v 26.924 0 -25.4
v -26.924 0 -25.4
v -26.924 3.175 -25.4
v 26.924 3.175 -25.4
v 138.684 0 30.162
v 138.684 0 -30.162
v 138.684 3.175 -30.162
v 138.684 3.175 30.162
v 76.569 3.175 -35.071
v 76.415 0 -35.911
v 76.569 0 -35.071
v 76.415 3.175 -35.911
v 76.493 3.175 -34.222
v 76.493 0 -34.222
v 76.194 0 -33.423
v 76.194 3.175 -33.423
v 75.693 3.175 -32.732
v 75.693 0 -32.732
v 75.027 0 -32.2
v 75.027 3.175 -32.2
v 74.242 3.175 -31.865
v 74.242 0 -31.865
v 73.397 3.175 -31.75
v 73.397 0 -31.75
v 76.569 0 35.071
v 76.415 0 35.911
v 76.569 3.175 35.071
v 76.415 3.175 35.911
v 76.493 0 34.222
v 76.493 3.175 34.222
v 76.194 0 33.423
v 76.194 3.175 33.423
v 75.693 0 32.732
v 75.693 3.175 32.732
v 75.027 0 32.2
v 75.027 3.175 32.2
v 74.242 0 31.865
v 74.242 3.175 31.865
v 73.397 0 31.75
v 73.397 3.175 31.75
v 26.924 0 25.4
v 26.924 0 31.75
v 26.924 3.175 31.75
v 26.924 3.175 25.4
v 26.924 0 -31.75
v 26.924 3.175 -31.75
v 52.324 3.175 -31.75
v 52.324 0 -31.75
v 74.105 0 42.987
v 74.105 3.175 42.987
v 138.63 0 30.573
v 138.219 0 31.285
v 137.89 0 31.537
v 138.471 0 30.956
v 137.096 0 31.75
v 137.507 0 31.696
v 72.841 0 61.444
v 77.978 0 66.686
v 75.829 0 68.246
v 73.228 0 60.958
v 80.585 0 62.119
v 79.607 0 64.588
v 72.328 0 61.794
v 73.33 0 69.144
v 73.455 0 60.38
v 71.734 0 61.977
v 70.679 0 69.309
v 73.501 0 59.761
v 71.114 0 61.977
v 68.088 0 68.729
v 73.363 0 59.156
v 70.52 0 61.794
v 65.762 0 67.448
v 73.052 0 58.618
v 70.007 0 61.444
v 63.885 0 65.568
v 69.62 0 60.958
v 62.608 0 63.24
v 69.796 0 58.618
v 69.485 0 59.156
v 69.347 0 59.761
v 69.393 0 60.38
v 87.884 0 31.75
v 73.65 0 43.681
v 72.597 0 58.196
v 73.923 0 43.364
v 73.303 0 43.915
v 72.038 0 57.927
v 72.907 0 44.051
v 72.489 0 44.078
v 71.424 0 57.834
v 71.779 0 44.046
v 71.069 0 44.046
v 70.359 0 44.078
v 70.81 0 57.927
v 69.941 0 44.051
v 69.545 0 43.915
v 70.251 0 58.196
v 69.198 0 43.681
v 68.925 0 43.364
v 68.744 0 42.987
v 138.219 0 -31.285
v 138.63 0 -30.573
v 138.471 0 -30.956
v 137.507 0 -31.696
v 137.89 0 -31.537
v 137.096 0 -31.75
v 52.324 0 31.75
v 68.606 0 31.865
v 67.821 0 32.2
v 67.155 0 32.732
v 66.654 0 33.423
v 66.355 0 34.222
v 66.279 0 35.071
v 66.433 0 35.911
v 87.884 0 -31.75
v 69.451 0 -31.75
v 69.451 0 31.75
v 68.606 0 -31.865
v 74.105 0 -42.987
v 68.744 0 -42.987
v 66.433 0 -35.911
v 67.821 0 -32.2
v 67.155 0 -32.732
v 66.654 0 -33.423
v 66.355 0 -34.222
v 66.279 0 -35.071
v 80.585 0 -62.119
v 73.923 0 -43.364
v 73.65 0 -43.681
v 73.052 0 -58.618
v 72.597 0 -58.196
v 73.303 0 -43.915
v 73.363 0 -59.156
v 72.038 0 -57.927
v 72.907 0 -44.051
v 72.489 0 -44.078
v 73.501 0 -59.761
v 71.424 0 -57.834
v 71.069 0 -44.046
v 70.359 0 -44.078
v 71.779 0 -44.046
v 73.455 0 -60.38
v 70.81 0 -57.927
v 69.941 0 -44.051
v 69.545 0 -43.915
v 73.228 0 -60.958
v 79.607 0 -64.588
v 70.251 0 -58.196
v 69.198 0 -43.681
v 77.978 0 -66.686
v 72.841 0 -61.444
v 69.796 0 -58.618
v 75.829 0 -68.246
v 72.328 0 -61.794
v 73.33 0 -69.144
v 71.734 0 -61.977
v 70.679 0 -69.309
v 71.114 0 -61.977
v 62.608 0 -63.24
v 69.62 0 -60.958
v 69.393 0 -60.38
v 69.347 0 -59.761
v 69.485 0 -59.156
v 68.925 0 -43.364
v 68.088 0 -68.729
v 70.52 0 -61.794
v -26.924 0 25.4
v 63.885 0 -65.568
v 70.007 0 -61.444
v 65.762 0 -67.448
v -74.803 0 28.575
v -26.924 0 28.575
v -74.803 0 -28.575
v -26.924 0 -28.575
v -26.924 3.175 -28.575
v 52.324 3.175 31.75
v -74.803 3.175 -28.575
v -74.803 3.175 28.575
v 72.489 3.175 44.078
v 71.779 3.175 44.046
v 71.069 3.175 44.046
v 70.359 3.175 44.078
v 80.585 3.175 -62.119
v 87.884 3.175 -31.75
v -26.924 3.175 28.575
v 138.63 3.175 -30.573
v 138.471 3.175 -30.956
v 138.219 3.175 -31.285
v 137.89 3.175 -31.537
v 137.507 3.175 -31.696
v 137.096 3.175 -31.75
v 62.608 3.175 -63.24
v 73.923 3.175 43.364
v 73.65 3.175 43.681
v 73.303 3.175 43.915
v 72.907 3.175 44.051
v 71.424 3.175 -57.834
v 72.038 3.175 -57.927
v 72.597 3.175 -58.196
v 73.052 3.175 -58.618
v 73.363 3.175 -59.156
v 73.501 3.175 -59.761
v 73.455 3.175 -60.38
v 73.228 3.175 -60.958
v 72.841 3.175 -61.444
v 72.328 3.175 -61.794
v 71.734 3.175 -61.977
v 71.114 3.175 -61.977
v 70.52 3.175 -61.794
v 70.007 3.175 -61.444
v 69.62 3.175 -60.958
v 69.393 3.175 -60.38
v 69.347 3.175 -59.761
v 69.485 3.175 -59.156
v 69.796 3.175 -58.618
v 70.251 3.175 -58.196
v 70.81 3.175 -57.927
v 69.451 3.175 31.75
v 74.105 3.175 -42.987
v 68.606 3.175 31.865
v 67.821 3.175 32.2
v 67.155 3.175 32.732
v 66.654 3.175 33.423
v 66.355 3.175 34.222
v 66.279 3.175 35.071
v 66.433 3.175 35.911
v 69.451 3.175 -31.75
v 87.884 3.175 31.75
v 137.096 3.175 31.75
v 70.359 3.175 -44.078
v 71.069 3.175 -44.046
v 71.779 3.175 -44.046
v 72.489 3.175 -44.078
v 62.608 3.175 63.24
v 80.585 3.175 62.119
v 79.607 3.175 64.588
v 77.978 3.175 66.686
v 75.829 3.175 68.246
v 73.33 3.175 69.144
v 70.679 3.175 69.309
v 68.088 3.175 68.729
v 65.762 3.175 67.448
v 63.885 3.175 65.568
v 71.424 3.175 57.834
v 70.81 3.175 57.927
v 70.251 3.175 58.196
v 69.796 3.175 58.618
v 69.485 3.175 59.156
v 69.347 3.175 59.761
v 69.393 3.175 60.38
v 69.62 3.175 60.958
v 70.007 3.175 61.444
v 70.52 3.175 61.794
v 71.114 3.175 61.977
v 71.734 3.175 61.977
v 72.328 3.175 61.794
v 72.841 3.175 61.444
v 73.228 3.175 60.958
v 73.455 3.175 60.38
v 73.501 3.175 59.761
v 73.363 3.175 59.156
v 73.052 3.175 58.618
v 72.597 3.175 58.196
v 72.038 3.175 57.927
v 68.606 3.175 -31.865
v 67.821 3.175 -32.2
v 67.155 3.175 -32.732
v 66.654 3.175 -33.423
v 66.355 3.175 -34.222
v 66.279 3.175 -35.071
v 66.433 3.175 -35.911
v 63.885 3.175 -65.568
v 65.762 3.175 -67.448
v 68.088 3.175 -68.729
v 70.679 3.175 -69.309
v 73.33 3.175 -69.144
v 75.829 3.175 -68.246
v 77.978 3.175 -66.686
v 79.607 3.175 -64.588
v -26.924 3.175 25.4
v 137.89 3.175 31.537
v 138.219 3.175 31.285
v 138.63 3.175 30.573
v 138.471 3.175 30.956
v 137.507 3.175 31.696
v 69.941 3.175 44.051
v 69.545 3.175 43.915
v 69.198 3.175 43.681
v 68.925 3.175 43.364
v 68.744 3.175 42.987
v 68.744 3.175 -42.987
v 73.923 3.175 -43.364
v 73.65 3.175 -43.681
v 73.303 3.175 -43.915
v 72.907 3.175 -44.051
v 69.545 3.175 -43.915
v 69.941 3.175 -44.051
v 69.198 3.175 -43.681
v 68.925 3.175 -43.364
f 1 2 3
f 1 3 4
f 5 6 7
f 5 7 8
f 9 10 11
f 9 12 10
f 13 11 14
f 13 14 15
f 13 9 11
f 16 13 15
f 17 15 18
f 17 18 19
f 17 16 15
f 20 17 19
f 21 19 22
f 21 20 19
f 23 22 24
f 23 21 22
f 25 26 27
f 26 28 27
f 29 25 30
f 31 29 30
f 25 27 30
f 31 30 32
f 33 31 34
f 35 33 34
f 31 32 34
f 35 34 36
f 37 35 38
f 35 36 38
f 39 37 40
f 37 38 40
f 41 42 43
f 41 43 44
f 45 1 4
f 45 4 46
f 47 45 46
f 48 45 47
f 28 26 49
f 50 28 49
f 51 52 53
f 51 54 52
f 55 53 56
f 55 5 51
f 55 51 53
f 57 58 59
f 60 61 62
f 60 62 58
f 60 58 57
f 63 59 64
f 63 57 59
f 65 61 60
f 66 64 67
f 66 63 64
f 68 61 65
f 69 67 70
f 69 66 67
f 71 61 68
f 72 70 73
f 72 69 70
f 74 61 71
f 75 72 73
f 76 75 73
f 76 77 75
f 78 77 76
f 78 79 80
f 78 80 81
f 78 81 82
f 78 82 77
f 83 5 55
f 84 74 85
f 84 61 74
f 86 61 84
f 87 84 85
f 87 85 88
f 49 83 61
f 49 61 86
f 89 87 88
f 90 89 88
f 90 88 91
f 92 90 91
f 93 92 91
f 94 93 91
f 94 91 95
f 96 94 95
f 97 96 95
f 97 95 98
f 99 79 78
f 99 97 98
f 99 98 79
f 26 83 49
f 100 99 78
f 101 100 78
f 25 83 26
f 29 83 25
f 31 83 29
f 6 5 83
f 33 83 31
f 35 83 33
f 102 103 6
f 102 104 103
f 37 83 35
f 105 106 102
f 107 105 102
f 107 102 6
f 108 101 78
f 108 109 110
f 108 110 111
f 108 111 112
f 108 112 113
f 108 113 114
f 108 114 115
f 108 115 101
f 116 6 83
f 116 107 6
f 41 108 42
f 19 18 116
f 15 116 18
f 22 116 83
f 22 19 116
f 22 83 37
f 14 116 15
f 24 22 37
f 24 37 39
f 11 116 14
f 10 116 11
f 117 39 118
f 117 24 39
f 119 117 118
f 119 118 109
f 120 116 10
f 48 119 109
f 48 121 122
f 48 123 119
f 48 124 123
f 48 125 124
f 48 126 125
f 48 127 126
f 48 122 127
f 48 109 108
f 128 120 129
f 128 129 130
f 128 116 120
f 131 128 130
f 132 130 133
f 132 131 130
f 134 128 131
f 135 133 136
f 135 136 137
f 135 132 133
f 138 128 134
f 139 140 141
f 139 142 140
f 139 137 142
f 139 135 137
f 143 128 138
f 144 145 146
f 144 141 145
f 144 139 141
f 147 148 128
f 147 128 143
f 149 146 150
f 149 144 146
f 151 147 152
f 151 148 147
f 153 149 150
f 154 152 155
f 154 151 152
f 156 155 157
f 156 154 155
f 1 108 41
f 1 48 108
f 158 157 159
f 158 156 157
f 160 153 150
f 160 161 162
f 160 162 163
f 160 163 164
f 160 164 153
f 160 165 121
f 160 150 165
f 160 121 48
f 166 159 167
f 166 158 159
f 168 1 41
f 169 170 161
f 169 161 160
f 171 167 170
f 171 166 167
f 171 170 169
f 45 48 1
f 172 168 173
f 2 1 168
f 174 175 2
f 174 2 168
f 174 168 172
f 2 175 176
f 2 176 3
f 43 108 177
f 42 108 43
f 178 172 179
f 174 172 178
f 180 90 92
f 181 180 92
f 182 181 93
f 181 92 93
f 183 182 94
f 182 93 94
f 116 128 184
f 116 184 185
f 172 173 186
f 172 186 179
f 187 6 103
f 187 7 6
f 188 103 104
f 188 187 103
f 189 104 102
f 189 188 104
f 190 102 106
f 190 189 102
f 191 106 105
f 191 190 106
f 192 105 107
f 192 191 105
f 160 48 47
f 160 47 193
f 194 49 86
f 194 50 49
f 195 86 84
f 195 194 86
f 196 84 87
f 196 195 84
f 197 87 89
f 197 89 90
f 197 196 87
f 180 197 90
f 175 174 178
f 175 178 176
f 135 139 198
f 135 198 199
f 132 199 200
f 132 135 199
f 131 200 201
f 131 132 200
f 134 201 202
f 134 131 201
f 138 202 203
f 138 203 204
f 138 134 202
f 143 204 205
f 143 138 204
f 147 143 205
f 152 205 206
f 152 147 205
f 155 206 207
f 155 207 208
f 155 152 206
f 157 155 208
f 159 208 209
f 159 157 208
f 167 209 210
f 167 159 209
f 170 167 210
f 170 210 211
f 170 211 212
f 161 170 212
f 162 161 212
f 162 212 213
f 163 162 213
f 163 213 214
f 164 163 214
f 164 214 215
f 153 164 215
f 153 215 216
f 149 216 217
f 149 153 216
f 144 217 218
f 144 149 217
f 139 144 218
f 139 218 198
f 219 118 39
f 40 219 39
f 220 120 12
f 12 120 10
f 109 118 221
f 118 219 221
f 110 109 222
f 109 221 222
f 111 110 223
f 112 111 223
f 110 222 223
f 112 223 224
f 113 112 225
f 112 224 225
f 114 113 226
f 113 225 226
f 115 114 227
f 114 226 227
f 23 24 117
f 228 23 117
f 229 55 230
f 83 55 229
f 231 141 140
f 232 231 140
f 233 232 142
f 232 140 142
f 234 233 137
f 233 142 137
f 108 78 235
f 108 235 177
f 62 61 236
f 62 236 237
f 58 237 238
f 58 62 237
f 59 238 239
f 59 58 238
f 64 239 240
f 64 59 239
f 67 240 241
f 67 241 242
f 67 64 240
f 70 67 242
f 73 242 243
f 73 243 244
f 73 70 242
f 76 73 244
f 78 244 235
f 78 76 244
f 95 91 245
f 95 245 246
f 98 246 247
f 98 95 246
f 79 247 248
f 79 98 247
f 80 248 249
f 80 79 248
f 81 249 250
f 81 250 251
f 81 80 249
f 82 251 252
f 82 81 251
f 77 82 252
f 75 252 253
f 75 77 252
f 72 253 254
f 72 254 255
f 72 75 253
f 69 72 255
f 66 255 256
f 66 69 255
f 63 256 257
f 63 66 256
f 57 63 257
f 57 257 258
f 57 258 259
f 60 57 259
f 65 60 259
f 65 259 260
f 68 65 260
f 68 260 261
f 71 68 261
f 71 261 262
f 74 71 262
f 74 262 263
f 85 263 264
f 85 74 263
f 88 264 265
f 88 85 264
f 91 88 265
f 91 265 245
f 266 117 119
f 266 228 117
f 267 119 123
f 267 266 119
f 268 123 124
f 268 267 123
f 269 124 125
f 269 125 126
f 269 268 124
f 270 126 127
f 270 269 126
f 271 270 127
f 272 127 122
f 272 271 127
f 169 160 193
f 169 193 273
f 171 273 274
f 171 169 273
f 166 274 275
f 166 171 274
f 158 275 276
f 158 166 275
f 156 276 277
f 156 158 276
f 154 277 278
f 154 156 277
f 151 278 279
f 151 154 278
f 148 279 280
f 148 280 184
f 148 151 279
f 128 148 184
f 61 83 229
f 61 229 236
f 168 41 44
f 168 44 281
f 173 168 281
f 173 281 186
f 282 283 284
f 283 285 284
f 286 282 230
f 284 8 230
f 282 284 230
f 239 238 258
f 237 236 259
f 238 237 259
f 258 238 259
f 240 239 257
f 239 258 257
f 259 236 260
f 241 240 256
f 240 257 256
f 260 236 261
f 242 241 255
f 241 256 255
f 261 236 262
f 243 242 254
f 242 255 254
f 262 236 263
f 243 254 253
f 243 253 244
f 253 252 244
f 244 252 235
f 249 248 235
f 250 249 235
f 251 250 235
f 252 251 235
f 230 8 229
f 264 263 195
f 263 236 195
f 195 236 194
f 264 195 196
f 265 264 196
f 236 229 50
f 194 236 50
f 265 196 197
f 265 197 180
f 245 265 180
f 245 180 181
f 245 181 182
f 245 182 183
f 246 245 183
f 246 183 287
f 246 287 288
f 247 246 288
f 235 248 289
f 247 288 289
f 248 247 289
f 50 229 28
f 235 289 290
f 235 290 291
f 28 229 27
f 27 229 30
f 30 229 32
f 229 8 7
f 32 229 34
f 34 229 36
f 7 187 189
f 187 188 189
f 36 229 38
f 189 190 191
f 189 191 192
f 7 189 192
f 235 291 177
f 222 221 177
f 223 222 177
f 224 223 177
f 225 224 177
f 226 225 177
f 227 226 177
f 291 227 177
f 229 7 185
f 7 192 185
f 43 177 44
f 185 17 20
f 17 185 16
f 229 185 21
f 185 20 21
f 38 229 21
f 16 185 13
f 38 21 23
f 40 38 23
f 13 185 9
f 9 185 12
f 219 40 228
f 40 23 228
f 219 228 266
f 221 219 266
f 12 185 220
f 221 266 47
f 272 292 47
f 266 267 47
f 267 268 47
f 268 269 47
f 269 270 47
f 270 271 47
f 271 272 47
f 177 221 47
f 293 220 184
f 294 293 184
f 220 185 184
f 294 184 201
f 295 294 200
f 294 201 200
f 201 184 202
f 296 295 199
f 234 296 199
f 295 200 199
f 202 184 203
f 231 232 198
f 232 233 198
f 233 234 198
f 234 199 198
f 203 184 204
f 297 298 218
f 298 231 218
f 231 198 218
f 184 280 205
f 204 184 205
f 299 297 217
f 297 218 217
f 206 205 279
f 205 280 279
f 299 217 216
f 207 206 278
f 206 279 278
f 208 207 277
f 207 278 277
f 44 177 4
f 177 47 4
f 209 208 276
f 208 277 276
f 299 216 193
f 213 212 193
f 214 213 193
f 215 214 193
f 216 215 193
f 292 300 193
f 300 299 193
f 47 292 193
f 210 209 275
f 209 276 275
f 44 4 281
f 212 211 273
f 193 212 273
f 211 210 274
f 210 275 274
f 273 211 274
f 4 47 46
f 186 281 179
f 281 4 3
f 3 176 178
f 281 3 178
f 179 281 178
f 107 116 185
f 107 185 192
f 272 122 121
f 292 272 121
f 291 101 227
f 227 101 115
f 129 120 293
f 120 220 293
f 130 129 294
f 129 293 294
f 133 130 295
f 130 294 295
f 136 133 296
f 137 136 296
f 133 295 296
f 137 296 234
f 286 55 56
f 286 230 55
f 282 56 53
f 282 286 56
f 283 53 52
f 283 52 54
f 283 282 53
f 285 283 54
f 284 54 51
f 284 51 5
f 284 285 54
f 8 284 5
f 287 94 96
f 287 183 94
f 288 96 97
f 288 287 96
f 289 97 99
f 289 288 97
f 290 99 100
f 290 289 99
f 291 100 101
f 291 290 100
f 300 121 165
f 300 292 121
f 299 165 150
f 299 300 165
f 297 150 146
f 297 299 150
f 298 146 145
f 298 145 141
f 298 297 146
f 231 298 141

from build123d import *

# Parameters (mm, degrees)
SKETCH1_R           = 2.0828
BOSS_EXTRUDE1_DEPTH = 3.175
FILLET1_R           = 1.5875
FILLET2_R           = 3.175
FILLET3_R           = 1.5875


with BuildPart() as part:
    # Sketch1 → Boss-Extrude1 (new body)
    with BuildSketch(Plane(origin=(0, 0, 0), x_dir=(1, 0, 0), z_dir=(0, 1, 0))):
        with BuildLine():
            Line((26.924, -25.4), (-26.924, -25.4))
            Line((-26.924, -25.4), (-26.924, -28.575))
            Line((-26.924, -28.575), (-46.228, -28.575))
            Line((-46.228, -28.575), (-74.803, -28.575))
            Line((-74.803, -28.575), (-74.803, 28.575))
            Line((-74.803, 28.575), (-46.228, 28.575))
            Line((-46.228, 28.575), (-26.924, 28.575))
            Line((-26.924, 28.575), (-26.924, 25.4))
            Line((-26.924, 25.4), (26.924, 25.4))
            Line((26.924, 25.4), (26.924, 31.75))
            Line((26.924, 31.75), (52.324, 31.75))
            Line((52.324, 31.75), (62.607581289, 63.240132856))
            ThreePointArc((62.607581289, 63.240132856), (72.010560326, 69.32064995), (80.585058538, 62.118797179))
            Line((80.585058538, 62.118797179), (87.884, 31.75))
            Line((87.884, 31.75), (138.684, 31.75))
            Line((138.684, 31.75), (138.684, -31.75))
            Line((138.684, -31.75), (87.884, -31.75))
            Line((87.884, -31.75), (80.585058538, -62.118797179))
            ThreePointArc((80.585058538, -62.118797179), (72.010560326, -69.32064995), (62.607581289, -63.240132856))
            Line((62.607581289, -63.240132856), (52.324, -31.75))
            Line((52.324, -31.75), (26.924, -31.75))
            Line((26.924, -31.75), (26.924, -25.4))
        make_face()
        with Locations(Location((71.4240126, 59.9169998, 0), (0, 0, 270))):
            Circle(SKETCH1_R, mode=Mode.SUBTRACT)
        with Locations(Location((71.4240126, -59.9169998, 0), (0, 0, 90))):
            Circle(SKETCH1_R, mode=Mode.SUBTRACT)
        with BuildLine():
            Line((77.7740126, 31.75), (65.0740126, 31.75))
            Line((65.0740126, 31.75), (69.141994412, 44.206875103))
            ThreePointArc((69.141994412, 44.206875103), (71.4240126, 44.0419998), (73.706030788, 44.206875103))
            Line((73.706030788, 44.206875103), (77.7740126, 31.75))
        make_face(mode=Mode.SUBTRACT)
        with BuildLine():
            Line((77.7740126, -31.75), (73.706030788, -44.206875103))
            ThreePointArc((73.706030788, -44.206875103), (71.4240126, -44.0419998), (69.141994412, -44.206875103))
            Line((69.141994412, -44.206875103), (65.0740126, -31.75))
            Line((65.0740126, -31.75), (77.7740126, -31.75))
        make_face(mode=Mode.SUBTRACT)
    extrude(amount=BOSS_EXTRUDE1_DEPTH)

    # Fillet1
    fillet1_edges = [part.edges().sort_by_distance(p)[0] for p in [
        (69.141994412, 1.5875, 44.206875103),
        (73.706030788, 1.5875, 44.206875103),
        (69.141994412, 1.5875, -44.206875103),
        (73.706030788, 1.5875, -44.206875103),
    ]]
    fillet(fillet1_edges, radius=FILLET1_R)

    # Fillet2
    fillet2_edges = [part.edges().sort_by_distance(p)[0] for p in [
        (77.7740126, 1.5875, 31.75),
        (65.0740126, 1.5875, 31.75),
        (65.0740126, 1.5875, -31.75),
        (77.7740126, 1.5875, -31.75),
    ]]
    fillet(fillet2_edges, radius=FILLET2_R)

    # Fillet3
    fillet3_edges = [part.edges().sort_by_distance(p)[0] for p in [
        (138.684, 1.5875, -31.75),
        (138.684, 1.5875, 31.75),
    ]]
    fillet(fillet3_edges, radius=FILLET3_R)


solid = part.part
